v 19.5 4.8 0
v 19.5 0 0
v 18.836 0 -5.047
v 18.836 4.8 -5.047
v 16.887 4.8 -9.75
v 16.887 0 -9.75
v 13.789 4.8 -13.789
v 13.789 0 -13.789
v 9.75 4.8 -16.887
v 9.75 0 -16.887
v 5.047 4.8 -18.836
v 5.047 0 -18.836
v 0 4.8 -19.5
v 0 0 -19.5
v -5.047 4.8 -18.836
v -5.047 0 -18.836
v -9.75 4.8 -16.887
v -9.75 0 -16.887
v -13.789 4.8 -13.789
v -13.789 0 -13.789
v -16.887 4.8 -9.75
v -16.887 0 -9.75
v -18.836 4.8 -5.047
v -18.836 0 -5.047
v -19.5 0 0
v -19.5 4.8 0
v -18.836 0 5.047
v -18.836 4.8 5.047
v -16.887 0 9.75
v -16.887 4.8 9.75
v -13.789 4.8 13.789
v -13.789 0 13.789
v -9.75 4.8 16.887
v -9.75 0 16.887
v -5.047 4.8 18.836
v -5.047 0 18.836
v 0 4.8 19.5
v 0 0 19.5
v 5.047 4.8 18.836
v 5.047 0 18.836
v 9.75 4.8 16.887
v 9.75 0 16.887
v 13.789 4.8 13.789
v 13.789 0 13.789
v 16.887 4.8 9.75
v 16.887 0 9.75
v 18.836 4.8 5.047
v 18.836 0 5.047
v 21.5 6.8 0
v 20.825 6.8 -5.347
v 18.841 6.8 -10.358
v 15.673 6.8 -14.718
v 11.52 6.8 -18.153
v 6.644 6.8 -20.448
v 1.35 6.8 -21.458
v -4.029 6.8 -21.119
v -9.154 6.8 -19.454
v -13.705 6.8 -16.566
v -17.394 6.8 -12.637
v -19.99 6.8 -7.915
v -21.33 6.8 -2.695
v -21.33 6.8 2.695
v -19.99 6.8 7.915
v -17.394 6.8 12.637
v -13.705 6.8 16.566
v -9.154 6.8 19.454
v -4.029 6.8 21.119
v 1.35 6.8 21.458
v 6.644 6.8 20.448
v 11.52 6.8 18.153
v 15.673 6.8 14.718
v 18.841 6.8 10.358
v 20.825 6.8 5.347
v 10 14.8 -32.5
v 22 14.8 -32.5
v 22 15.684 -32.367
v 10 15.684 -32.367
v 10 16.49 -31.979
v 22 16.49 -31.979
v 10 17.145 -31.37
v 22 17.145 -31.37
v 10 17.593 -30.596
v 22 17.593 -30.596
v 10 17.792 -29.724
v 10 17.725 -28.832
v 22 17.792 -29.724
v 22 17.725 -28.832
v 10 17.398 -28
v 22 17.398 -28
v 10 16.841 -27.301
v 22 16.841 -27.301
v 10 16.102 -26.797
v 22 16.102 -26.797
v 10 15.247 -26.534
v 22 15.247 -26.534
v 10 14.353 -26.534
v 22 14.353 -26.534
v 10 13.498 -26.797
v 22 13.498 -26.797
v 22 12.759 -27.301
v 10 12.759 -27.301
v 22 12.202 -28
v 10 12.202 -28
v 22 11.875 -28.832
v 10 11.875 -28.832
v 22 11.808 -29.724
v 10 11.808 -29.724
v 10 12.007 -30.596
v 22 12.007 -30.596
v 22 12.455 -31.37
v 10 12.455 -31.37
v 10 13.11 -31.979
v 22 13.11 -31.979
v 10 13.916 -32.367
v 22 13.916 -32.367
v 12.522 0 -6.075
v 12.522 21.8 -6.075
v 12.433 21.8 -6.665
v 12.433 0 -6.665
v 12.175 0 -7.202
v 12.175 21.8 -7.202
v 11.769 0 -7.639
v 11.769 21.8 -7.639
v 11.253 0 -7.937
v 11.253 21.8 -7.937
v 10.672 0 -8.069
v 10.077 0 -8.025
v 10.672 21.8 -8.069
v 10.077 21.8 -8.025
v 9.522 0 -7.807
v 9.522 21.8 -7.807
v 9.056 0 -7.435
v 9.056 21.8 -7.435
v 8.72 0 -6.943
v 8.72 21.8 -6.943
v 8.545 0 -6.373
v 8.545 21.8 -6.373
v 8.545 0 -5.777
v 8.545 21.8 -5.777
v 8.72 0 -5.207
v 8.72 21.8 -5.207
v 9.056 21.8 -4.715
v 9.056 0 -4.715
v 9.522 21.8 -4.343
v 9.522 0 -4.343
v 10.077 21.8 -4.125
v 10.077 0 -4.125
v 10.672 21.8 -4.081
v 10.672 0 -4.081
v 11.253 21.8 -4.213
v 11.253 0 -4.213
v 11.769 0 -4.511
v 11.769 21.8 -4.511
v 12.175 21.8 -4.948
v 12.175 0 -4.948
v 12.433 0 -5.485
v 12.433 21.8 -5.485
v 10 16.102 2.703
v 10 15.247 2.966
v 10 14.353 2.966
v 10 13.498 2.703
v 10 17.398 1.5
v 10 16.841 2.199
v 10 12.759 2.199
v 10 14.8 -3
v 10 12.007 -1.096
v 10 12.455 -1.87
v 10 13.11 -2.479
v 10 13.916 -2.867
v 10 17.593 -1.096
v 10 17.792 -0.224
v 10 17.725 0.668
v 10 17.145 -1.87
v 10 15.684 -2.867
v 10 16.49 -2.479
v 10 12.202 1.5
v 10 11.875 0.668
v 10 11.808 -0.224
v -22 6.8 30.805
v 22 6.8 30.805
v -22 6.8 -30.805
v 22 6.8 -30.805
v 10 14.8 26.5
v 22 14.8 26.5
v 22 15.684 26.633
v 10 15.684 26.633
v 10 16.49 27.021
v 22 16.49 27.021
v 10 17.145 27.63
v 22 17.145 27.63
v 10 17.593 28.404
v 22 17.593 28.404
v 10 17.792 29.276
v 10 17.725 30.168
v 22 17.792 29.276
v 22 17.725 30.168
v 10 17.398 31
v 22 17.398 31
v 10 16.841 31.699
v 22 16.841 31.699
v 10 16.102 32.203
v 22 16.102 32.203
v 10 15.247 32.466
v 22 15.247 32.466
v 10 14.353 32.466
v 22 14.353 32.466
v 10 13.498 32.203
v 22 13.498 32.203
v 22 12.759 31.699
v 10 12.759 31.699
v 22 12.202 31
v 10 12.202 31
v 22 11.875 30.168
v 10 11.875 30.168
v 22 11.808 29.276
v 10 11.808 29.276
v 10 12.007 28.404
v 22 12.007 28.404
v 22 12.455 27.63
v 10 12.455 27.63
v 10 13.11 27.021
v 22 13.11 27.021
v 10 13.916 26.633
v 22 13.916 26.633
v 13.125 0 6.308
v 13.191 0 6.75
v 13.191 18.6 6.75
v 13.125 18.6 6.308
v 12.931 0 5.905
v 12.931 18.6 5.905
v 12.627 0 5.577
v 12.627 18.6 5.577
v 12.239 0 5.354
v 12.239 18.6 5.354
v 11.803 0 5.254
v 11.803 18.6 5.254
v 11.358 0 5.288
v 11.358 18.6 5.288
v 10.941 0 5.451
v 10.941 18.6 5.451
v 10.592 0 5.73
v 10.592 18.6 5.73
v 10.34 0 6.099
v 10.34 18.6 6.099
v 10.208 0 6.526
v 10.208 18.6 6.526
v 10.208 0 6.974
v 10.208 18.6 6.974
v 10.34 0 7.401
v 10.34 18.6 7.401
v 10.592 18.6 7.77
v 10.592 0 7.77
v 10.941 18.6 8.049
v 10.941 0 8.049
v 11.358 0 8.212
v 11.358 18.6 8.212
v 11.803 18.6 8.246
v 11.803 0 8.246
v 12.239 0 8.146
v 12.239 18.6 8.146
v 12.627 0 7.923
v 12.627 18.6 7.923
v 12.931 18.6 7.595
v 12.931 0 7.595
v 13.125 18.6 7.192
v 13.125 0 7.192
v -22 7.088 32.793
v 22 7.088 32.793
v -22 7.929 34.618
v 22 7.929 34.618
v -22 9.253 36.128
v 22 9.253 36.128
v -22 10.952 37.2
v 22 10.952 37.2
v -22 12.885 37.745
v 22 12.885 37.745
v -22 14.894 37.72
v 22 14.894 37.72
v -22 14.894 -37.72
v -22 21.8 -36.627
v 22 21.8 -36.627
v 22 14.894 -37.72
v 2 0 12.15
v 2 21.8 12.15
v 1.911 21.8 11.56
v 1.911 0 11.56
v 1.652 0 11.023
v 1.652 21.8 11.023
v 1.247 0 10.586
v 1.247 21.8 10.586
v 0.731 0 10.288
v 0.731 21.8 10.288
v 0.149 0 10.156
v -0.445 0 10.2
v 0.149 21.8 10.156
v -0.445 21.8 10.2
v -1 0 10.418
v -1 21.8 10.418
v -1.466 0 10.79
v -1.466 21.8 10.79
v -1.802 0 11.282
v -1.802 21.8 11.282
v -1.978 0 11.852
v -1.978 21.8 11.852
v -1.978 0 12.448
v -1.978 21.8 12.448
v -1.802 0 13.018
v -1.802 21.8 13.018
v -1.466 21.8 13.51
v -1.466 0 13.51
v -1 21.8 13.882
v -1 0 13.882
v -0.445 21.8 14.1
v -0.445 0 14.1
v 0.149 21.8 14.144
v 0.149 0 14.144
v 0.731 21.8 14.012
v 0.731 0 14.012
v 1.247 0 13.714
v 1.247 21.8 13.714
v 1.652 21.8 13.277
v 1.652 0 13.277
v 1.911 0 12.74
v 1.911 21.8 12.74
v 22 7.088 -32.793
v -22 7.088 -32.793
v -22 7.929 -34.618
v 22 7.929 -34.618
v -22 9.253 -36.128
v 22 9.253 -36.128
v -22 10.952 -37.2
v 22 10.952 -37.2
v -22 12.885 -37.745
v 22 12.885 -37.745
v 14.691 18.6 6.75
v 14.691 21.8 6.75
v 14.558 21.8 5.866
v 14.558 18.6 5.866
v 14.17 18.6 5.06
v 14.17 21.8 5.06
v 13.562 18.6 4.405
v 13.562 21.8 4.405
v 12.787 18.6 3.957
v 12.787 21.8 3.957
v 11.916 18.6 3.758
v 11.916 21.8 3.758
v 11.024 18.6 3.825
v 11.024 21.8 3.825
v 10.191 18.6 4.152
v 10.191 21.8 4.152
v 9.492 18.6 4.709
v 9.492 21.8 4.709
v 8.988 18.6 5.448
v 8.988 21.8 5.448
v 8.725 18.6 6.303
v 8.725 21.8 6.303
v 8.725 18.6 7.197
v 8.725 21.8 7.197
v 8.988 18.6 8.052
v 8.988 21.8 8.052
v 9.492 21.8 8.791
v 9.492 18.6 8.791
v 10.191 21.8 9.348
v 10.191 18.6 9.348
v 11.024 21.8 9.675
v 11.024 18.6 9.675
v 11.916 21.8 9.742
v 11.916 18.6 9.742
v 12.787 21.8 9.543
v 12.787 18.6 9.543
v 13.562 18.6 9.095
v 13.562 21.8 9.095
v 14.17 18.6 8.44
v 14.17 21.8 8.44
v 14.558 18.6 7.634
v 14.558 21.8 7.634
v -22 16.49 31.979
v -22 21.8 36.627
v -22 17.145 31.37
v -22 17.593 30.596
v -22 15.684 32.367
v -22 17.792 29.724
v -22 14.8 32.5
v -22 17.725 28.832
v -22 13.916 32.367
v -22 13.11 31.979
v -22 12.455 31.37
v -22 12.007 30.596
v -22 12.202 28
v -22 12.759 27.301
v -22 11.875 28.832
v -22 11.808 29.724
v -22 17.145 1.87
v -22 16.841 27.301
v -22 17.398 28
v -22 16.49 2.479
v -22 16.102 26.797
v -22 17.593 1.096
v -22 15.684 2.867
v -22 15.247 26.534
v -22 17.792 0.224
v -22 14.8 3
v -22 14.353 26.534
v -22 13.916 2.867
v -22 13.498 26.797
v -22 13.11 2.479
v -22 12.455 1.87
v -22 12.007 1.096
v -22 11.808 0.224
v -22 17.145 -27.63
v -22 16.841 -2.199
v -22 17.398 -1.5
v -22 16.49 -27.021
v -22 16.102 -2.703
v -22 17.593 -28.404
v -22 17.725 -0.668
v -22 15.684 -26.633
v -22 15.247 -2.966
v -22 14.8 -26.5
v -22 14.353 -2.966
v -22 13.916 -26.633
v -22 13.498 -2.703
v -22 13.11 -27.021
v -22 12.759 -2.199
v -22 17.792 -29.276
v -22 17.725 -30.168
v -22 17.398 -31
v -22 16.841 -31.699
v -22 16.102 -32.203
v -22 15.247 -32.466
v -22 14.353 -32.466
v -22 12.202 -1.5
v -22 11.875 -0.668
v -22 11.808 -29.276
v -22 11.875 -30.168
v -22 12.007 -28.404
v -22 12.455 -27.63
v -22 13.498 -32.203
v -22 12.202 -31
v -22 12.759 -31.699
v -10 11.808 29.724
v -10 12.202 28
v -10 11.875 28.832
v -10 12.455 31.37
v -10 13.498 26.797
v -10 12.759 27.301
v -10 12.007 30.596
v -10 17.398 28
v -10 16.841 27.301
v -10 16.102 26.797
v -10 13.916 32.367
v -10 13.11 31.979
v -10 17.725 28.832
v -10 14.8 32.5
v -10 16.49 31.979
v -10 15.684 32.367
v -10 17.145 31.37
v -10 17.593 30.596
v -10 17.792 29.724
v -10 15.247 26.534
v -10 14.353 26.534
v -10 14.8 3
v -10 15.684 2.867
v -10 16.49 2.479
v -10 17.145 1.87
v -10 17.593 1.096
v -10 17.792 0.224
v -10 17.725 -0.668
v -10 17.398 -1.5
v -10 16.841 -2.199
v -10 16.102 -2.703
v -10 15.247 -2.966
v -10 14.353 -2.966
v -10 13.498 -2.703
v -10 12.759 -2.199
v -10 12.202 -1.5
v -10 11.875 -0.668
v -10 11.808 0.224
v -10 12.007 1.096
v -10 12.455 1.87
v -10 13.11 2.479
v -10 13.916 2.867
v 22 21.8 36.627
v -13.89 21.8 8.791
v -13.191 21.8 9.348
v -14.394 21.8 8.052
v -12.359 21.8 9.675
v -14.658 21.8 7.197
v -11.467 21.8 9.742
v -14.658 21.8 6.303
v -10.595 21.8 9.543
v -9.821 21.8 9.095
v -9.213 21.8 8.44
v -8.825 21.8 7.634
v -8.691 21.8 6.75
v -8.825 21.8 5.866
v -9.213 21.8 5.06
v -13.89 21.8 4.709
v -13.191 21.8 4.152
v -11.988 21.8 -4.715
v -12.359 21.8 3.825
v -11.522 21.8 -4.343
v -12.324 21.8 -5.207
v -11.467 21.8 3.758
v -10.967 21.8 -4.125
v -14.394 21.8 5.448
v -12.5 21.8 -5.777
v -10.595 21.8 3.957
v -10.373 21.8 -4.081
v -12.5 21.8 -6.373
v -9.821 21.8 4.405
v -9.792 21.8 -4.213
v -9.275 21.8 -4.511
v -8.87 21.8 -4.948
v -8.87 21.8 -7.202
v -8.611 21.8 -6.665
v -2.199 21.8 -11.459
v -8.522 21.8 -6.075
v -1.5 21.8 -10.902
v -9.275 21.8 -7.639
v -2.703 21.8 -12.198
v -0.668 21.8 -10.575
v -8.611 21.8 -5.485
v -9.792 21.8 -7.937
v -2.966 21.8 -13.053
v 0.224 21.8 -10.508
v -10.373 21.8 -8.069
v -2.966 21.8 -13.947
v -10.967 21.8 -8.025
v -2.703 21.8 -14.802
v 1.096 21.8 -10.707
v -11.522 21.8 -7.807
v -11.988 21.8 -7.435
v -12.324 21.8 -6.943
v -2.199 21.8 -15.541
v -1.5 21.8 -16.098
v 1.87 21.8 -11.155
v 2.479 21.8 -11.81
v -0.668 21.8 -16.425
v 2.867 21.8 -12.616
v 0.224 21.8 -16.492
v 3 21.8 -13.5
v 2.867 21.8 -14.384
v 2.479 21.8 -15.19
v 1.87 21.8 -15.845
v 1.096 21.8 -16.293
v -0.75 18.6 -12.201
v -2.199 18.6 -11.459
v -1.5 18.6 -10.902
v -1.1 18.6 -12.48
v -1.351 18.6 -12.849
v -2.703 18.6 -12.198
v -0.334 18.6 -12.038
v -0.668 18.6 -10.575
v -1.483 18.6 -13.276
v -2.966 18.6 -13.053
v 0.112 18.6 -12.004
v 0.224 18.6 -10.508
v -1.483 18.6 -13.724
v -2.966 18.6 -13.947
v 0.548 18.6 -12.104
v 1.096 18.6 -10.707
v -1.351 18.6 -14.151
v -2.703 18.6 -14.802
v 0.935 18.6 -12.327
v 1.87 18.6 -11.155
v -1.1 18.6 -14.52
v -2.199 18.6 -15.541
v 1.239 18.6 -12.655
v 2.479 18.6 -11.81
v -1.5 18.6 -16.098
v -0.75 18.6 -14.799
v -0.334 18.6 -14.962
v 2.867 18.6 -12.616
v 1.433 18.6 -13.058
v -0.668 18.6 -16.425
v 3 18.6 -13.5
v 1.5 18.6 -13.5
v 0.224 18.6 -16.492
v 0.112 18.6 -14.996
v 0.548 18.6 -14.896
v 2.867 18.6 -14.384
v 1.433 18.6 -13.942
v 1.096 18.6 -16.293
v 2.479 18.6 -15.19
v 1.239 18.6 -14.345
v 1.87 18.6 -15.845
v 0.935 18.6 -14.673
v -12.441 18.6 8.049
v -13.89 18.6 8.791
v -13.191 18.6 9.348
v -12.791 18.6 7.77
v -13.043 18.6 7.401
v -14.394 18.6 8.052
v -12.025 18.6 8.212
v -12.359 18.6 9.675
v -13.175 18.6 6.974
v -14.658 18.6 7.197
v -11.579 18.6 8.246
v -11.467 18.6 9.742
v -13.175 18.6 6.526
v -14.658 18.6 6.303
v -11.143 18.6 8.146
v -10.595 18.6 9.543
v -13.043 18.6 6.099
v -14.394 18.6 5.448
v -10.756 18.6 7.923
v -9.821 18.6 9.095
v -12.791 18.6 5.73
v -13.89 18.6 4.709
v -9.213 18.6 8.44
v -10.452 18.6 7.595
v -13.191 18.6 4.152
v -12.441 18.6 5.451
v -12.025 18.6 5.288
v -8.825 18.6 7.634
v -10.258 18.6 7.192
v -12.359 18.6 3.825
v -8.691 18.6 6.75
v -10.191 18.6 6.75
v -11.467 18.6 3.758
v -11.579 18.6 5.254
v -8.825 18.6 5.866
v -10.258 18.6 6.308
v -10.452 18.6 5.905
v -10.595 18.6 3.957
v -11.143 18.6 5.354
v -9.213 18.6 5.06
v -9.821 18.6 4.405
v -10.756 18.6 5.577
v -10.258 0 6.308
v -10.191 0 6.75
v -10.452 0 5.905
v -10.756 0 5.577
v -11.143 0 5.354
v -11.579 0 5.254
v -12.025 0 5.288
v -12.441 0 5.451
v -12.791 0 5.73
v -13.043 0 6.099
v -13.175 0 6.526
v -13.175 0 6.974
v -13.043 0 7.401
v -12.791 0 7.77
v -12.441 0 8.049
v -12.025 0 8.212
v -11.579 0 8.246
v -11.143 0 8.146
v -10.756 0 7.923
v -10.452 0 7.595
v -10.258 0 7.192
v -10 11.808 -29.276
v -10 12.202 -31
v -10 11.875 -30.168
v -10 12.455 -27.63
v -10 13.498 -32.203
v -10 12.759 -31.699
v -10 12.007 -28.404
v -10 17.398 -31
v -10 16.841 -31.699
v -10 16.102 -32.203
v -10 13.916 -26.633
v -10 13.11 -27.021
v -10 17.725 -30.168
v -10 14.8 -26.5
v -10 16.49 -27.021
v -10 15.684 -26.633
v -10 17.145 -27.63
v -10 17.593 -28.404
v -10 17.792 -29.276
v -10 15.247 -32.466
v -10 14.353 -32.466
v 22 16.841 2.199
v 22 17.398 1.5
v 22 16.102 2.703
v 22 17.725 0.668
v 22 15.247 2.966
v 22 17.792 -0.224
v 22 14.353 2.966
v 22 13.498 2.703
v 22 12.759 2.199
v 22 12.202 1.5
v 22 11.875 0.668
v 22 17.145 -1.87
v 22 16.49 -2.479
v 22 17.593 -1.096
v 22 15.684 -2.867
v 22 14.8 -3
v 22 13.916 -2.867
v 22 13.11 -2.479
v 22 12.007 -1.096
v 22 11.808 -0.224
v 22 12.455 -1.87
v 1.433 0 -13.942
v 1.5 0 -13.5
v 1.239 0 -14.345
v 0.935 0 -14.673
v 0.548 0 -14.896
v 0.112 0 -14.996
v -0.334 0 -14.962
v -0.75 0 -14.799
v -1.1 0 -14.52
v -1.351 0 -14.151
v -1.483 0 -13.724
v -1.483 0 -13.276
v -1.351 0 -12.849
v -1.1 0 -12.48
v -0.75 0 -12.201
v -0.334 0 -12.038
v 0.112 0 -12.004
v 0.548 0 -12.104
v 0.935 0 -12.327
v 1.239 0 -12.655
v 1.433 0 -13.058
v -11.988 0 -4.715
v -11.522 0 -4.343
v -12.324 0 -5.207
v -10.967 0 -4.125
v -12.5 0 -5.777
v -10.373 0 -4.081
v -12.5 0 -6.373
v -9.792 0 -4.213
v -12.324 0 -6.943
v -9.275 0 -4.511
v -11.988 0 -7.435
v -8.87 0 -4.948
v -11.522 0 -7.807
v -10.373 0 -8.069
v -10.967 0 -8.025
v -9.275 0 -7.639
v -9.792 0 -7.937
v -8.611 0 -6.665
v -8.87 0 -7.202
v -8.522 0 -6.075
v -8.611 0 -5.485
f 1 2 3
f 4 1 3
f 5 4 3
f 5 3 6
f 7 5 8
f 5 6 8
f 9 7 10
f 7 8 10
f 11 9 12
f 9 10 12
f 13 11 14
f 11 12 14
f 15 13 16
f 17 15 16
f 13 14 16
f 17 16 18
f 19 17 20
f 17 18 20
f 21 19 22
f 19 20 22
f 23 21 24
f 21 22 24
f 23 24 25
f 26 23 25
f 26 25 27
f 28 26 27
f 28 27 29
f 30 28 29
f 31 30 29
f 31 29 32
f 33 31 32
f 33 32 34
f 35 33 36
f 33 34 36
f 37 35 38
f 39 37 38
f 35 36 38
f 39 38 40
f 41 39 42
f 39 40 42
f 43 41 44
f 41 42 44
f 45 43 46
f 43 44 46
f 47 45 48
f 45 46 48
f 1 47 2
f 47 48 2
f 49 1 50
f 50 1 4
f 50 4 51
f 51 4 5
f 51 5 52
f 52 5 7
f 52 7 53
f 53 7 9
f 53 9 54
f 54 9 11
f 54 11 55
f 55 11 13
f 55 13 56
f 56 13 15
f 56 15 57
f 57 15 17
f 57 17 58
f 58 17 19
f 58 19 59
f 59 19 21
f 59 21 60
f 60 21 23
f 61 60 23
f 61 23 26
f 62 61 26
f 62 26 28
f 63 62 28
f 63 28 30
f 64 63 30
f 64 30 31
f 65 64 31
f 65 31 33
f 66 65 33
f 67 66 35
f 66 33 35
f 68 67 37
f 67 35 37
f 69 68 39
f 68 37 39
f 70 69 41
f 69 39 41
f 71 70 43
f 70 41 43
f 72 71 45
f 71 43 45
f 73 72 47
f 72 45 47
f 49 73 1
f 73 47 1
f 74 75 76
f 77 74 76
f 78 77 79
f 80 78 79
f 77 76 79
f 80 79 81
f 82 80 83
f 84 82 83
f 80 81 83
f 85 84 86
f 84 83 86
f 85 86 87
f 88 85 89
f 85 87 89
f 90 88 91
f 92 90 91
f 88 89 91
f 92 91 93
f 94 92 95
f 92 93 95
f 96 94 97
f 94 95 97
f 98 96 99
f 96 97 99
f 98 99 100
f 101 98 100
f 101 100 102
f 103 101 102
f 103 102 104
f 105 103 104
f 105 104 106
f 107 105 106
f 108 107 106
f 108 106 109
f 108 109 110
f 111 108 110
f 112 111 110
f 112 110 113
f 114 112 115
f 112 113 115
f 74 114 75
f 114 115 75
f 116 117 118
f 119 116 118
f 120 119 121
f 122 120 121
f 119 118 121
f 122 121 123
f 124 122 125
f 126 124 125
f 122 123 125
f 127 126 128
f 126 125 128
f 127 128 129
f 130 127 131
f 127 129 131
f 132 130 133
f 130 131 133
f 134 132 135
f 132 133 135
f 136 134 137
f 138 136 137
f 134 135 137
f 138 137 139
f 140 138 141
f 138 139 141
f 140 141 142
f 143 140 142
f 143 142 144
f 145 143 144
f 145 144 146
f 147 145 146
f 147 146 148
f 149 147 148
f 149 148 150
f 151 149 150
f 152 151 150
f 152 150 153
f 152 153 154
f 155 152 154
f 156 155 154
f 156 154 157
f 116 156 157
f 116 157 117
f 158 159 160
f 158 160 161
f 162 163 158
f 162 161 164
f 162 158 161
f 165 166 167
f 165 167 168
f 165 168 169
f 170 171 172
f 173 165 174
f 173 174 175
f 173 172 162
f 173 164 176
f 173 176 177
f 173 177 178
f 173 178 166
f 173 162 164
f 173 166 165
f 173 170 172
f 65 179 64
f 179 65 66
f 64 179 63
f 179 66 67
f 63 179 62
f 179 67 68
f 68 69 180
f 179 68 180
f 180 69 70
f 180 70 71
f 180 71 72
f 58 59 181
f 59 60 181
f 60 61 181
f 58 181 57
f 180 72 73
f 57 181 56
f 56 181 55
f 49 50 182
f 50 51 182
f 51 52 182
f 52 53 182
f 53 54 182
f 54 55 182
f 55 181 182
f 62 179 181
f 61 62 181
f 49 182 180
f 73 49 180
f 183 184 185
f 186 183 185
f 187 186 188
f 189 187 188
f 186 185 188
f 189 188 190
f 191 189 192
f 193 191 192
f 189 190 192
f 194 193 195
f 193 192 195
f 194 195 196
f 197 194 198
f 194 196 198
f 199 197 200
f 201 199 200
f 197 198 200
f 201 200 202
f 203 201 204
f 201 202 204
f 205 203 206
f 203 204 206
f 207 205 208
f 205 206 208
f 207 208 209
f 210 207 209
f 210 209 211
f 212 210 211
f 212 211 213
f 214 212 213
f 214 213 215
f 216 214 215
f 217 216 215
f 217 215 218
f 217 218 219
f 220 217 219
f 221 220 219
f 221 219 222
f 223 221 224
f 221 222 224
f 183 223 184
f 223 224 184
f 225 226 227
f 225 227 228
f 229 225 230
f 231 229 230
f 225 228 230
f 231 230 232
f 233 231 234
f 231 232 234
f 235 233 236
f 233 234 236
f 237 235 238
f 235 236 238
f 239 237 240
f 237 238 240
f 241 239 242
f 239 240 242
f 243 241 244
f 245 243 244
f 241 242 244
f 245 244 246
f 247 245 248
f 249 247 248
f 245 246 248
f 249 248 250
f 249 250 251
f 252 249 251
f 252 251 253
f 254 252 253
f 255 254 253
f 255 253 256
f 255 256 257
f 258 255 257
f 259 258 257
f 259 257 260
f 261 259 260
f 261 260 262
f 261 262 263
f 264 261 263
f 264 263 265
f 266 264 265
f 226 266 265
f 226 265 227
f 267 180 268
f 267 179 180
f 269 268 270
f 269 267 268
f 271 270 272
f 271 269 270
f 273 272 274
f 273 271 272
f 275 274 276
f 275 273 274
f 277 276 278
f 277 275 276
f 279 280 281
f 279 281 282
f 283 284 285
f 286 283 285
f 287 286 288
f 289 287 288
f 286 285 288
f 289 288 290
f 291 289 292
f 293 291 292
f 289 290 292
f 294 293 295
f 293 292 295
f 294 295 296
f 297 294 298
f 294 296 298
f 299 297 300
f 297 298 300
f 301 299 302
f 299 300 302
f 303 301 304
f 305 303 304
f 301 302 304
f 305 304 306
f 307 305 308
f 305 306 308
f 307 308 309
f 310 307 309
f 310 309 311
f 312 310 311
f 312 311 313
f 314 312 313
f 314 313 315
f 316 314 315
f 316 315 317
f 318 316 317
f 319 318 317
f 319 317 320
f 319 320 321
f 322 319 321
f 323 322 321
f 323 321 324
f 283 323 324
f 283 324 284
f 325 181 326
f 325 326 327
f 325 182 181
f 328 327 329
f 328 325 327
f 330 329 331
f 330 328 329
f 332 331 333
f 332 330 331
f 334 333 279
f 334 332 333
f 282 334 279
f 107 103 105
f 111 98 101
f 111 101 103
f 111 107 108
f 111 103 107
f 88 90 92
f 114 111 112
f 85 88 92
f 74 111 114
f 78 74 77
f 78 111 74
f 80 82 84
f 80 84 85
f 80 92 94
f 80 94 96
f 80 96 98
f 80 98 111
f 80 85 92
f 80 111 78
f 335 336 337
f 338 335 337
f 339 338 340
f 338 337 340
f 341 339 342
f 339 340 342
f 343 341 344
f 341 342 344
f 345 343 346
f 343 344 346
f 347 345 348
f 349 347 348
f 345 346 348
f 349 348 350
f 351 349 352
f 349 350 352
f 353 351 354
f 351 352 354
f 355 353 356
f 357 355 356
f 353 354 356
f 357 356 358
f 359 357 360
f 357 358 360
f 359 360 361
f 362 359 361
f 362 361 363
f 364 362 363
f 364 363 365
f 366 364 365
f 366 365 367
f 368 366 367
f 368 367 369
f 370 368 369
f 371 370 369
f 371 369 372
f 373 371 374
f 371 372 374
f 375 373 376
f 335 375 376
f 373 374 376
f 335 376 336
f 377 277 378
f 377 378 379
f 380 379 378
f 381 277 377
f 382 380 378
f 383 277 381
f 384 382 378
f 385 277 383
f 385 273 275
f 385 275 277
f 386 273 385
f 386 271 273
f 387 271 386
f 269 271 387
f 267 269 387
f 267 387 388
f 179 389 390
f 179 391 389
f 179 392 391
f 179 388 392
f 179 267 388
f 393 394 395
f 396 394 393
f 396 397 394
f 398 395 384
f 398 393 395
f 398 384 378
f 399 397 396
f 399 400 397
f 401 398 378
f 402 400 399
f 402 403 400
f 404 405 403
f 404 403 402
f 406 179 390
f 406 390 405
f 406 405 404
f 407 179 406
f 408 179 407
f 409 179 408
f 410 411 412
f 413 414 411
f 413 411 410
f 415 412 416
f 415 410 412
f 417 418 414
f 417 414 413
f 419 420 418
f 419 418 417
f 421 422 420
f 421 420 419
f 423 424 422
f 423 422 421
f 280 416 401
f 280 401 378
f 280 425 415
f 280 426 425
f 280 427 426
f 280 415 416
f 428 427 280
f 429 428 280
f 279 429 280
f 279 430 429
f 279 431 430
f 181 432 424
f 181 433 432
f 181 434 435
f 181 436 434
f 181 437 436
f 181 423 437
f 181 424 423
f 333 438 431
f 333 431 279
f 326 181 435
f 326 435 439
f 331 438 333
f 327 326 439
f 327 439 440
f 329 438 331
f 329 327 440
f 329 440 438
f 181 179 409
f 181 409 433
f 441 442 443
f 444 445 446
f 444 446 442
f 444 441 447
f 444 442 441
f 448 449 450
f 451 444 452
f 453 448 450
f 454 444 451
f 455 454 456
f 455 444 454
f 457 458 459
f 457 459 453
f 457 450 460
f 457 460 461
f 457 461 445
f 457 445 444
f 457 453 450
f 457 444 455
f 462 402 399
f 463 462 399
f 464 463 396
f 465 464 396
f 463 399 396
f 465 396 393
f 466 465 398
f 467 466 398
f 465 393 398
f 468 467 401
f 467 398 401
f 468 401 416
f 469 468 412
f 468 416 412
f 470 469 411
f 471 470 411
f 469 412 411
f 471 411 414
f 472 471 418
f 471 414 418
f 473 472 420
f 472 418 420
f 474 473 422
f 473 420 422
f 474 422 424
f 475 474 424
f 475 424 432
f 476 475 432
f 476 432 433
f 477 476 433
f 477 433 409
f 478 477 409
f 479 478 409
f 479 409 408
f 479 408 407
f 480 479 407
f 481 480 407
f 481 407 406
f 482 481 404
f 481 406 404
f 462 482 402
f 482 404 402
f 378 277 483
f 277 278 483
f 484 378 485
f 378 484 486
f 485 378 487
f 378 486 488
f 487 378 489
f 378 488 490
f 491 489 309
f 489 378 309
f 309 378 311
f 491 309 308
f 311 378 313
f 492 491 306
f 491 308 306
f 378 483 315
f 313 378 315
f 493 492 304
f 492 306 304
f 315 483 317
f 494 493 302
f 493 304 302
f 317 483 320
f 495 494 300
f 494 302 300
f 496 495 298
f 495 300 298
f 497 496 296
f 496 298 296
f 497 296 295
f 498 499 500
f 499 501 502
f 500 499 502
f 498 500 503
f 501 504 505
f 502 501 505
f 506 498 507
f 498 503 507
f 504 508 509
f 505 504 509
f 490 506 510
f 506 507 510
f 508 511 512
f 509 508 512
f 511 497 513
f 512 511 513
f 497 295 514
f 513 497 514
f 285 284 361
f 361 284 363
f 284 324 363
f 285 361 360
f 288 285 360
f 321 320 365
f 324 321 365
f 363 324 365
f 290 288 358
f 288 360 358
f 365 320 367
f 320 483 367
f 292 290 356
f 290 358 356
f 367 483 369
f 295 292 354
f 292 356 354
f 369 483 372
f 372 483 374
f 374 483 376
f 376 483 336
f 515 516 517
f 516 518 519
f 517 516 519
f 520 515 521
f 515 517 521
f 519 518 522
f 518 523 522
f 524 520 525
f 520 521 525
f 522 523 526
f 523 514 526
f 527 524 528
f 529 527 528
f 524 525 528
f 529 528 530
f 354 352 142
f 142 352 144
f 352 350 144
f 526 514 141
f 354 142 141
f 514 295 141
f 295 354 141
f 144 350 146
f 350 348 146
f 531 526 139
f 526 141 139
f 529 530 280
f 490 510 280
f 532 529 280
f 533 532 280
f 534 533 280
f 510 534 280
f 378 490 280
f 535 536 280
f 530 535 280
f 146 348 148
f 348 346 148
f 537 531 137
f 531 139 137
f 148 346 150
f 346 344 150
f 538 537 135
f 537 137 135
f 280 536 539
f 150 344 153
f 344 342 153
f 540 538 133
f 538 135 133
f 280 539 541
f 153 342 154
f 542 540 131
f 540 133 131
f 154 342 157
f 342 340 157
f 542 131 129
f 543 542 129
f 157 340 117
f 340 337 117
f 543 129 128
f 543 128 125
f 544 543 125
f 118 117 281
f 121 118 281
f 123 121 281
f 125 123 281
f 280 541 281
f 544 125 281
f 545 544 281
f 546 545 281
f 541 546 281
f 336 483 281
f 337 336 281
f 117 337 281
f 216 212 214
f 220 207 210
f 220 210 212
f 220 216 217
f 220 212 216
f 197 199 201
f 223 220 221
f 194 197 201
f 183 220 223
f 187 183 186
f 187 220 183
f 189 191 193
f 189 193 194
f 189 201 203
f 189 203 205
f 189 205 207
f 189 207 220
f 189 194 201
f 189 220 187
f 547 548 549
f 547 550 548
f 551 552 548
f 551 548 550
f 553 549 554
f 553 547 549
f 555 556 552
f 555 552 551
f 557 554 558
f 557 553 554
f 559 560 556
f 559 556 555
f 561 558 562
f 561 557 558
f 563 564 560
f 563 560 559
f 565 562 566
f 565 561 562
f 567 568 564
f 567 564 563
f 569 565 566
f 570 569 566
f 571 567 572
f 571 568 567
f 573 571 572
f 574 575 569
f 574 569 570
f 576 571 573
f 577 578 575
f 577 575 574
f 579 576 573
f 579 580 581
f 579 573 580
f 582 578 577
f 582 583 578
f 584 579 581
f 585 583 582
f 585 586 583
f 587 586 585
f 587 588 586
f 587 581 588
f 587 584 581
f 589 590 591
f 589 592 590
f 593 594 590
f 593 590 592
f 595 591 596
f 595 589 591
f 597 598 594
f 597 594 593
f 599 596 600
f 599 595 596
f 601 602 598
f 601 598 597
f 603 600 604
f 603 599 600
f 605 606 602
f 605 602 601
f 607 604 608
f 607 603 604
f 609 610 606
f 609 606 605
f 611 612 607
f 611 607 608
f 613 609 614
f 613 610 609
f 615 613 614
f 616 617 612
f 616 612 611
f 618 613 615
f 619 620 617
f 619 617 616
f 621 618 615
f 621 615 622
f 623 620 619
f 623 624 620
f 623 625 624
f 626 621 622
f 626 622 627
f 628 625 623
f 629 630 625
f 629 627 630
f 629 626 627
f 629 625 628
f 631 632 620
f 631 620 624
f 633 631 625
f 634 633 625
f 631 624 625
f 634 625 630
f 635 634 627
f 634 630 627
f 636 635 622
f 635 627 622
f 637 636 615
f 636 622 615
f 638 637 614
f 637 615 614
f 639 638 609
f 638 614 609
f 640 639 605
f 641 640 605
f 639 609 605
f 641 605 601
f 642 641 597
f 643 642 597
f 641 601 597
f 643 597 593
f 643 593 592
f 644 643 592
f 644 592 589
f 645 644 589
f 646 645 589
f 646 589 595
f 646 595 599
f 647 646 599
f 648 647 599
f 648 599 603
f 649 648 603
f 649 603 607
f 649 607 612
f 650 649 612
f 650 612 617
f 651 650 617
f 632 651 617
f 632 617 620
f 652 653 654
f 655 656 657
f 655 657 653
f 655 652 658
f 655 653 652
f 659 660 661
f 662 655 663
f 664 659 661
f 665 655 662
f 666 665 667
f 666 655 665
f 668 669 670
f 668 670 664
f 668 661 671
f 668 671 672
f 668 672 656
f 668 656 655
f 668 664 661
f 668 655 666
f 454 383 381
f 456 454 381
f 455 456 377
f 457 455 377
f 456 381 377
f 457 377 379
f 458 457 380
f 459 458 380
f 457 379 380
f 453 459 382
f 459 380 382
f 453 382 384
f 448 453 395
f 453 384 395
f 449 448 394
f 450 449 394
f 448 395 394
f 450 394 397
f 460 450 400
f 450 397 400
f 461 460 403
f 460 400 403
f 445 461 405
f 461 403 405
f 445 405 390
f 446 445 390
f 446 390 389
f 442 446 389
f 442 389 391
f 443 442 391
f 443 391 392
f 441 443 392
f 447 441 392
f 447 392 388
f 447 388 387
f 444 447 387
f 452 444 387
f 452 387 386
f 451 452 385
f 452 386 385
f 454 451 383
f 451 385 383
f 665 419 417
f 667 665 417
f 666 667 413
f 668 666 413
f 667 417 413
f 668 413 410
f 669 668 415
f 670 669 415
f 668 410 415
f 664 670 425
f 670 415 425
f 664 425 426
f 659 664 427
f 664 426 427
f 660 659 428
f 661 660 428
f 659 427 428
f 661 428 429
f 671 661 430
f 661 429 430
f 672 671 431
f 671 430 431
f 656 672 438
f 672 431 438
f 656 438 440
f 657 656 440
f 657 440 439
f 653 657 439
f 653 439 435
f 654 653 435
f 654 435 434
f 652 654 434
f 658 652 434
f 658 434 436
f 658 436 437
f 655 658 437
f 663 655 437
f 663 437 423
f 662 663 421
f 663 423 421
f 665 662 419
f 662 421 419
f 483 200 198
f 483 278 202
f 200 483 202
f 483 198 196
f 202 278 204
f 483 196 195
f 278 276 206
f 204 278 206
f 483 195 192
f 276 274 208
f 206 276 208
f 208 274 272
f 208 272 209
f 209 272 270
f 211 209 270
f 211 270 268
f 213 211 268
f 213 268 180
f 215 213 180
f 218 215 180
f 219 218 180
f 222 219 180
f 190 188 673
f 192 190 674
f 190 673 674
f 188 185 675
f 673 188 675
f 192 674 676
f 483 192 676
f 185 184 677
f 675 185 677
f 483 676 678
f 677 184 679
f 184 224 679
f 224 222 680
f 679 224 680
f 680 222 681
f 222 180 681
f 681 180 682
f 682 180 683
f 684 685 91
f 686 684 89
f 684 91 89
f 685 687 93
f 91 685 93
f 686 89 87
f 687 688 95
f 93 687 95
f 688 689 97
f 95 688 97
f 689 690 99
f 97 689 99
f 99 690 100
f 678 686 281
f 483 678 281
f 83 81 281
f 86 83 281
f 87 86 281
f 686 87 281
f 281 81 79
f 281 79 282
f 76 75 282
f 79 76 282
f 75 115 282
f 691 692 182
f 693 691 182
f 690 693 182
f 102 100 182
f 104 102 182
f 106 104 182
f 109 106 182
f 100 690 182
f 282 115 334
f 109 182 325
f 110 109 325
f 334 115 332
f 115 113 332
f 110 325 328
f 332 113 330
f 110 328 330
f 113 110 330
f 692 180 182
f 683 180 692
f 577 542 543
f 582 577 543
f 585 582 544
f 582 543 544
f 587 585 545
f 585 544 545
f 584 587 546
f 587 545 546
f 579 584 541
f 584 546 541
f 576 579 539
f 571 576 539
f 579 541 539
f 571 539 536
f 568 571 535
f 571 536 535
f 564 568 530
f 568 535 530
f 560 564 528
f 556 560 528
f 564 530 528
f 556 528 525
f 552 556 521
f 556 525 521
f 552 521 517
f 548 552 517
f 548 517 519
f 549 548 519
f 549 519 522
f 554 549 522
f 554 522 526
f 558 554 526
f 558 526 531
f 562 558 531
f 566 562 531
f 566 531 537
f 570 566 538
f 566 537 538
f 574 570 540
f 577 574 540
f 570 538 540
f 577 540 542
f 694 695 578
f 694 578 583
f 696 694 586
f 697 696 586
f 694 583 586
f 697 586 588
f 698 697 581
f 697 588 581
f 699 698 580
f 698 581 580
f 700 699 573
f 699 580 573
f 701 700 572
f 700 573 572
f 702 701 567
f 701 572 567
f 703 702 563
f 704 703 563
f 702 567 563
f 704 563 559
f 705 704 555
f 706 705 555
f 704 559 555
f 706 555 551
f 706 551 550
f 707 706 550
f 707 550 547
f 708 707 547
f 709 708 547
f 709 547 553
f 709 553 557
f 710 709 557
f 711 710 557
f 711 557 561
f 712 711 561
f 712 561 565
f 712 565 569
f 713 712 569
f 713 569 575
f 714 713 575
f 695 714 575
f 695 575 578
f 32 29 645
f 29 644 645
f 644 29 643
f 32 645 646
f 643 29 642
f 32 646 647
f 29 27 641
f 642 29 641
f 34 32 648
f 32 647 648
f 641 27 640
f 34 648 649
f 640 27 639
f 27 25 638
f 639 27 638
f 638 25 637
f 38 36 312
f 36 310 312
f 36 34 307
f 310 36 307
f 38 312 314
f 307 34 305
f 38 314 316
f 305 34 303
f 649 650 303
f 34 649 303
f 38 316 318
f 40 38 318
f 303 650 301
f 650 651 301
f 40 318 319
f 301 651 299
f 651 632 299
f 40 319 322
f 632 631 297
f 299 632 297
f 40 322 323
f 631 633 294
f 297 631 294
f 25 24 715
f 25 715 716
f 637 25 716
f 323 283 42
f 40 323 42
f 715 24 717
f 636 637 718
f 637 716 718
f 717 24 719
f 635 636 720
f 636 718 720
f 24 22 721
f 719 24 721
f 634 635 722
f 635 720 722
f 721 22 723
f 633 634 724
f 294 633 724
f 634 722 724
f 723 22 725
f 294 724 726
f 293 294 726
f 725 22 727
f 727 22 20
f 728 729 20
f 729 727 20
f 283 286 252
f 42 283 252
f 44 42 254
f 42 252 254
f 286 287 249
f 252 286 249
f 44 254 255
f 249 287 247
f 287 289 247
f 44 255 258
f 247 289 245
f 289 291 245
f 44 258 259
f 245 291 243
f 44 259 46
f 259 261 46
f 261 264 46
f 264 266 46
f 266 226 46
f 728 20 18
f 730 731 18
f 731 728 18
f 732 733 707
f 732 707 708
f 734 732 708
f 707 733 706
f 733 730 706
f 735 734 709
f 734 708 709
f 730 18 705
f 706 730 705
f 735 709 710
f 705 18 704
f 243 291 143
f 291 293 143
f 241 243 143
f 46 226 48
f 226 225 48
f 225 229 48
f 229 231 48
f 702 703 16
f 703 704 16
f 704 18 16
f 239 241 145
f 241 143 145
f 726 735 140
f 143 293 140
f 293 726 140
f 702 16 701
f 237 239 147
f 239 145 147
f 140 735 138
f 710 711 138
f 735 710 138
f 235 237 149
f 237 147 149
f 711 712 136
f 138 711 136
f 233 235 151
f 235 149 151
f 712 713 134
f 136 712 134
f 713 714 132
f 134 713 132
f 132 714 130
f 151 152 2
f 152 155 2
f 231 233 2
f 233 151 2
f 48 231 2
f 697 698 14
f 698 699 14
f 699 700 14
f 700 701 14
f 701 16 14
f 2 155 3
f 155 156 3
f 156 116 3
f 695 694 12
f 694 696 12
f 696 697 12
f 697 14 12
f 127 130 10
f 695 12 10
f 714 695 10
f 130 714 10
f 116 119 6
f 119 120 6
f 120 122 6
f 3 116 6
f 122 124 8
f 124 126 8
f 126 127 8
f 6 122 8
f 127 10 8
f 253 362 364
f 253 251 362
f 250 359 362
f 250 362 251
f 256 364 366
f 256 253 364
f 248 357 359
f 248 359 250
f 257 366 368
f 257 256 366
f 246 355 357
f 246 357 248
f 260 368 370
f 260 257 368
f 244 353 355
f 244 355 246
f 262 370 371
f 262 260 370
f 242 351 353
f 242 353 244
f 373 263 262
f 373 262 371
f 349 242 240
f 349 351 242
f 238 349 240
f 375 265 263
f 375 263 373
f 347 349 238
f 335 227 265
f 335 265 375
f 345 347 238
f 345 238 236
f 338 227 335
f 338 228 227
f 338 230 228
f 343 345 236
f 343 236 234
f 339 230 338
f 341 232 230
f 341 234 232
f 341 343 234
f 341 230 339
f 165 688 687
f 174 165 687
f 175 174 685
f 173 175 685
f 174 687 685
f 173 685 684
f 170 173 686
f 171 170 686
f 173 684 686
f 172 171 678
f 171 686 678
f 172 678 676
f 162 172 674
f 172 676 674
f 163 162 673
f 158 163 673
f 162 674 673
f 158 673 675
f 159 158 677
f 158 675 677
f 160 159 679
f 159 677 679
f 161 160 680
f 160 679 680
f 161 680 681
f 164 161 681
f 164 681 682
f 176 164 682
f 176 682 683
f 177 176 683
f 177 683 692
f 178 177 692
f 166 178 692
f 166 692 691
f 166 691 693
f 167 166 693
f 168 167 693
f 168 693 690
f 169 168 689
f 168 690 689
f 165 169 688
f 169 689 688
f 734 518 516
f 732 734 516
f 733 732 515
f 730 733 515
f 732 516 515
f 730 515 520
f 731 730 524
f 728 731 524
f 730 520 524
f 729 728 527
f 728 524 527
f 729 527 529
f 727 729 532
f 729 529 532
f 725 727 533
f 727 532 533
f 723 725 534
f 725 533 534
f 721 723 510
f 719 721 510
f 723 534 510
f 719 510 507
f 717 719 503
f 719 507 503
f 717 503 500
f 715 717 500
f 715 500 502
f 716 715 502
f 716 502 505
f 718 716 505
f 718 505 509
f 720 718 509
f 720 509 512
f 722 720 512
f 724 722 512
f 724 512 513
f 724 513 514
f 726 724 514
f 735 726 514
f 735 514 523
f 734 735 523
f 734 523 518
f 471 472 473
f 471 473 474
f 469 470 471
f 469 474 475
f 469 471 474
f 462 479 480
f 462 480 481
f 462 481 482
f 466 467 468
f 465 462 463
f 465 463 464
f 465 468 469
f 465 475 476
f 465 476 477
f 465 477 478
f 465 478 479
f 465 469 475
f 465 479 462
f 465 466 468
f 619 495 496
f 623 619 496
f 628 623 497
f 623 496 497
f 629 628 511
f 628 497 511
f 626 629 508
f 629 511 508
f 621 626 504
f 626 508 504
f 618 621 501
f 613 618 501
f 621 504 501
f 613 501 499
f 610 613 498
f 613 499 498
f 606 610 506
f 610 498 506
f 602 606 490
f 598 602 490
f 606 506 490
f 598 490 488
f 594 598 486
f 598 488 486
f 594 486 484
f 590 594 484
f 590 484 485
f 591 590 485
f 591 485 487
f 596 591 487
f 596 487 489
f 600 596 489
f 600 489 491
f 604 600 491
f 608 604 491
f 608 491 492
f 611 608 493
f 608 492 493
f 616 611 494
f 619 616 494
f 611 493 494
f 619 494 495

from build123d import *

# Parameters (mm, degrees)
SKETCH_1_R          = 19.5
SKETCH_1_R_2        = 2
SKETCH_1_R_3        = 1.5
EXTRUDE_1_DEPTH     = 6.8
SKETCH_2_W          = 44
SKETCH_2_H          = 78
EXTRUDE_2_DEPTH     = 70
SKETCH_3_R          = 3
CUT_EXTRUDE_1_DEPTH = 12
CUT_EXTRUDE_2_DEPTH = 33
SKETCH_6_R          = 3
CUT_EXTRUDE_3_DEPTH = 12
CHAMFER_1_SIZE      = 2
FILLET_1_R          = 7
SKETCH_7_R          = 2
SKETCH_7_R_2        = 1.5
CUT_EXTRUDE_4_DEPTH = 22.8
SKETCH_8_R          = 3
CUT_EXTRUDE_5_DEPTH = 3.2


with BuildPart() as part:
    # 草图1 → 凸台-拉伸1 (new body)
    with BuildSketch(Plane(origin=(0, 0, 0), x_dir=(1, 0, 0), z_dir=(0, 1, 0))):
        Circle(SKETCH_1_R)
        with Locations((10.522208656, 6.075)):
            Circle(SKETCH_1_R_2, mode=Mode.SUBTRACT)
        with Locations((-10.522208656, 6.075)):
            Circle(SKETCH_1_R_2, mode=Mode.SUBTRACT)
        with Locations((0, -12.15)):
            Circle(SKETCH_1_R_2, mode=Mode.SUBTRACT)
        with Locations((0, 13.5)):
            Circle(SKETCH_1_R_3, mode=Mode.SUBTRACT)
        with Locations((11.691342951, -6.75)):
            Circle(SKETCH_1_R_3, mode=Mode.SUBTRACT)
        with Locations((-11.691342951, -6.75)):
            Circle(SKETCH_1_R_3, mode=Mode.SUBTRACT)
    extrude(amount=EXTRUDE_1_DEPTH)

    # 草图2 → 凸台-拉伸2 (add)
    with BuildSketch(Plane(origin=(0, 6.8, 0), x_dir=(1, 0, 0), z_dir=(0, 1, 0))):
        Rectangle(SKETCH_2_W, SKETCH_2_H)
    extrude(amount=EXTRUDE_2_DEPTH)

    # 草图3 → 切除-拉伸1 (cut)
    with BuildSketch(Plane(origin=(22, 0, 0), x_dir=(0, 0, -1), z_dir=(1, 0, 0))):
        with Locations((0, 14.8)):
            Circle(SKETCH_3_R)
        with Locations((-29.5, 14.8)):
            Circle(SKETCH_3_R)
        with Locations((29.5, 14.8)):
            Circle(SKETCH_3_R)
        Polygon((-39, 6.8), (-36.626907991, 21.8), (36.626907991, 21.8), (39, 6.8), (44.081826142, 6.8), (44.081826142, 83.498576474), (-44.081826142, 83.498576474), (-44.081826142, 6.8), align=None)
    extrude(amount=-CUT_EXTRUDE_1_DEPTH, mode=Mode.SUBTRACT)

    # 草图5 → 切除-拉伸2 (cut, through all)
    with BuildSketch(Plane(origin=(10, 0, 0), x_dir=(0, 0, -1), z_dir=(1, 0, 0))):
        Polygon((-39, 6.8), (-36.626907991, 21.8), (36.626907991, 21.8), (39, 6.8), (39, 76.8), (-39, 76.8), align=None)
    extrude(amount=-CUT_EXTRUDE_2_DEPTH, mode=Mode.SUBTRACT)

    # 草图6 → 切除-拉伸3 (cut)
    with BuildSketch(Plane.ZY.offset(22)):
        with Locations((-29.5, 14.8)):
            Circle(SKETCH_6_R)
        with Locations((0, 14.8)):
            Circle(SKETCH_6_R)
        with Locations((29.5, 14.8)):
            Circle(SKETCH_6_R)
    extrude(amount=-CUT_EXTRUDE_3_DEPTH, mode=Mode.SUBTRACT)

    # 倒角1
    chamfer_1_edges = [part.edges().sort_by_distance(p)[0] for p in [
        (-19.5, 6.8, 0),
    ]]
    chamfer(chamfer_1_edges, length=CHAMFER_1_SIZE)

    # 圆角1
    fillet_1_edges = [part.edges().sort_by_distance(p)[0] for p in [
        (0, 6.8, -39),
        (0, 6.8, 39),
    ]]
    fillet(fillet_1_edges, radius=FILLET_1_R)

    # 草图7 → 切除-拉伸4 (cut, through all)
    with BuildSketch(Plane(origin=(0, 21.8, 0), x_dir=(1, 0, 0), z_dir=(0, 1, 0))):
        with Locations((10.522208656, 6.075)):
            Circle(SKETCH_7_R)
        with Locations((11.691342951, -6.75)):
            Circle(SKETCH_7_R_2)
        with Locations((0, -12.15)):
            Circle(SKETCH_7_R)
        with Locations((-11.691342951, -6.75)):
            Circle(SKETCH_7_R_2)
        with Locations((-10.522208656, 6.075)):
            Circle(SKETCH_7_R)
        with Locations((0, 13.5)):
            Circle(SKETCH_7_R_2)
    extrude(amount=-CUT_EXTRUDE_4_DEPTH, mode=Mode.SUBTRACT)

    # 草图8 → 切除-拉伸5 (cut)
    with BuildSketch(Plane(origin=(0, 21.8, 0), x_dir=(1, 0, 0), z_dir=(0, 1, 0))):
        with Locations((0, 13.5)):
            Circle(SKETCH_8_R)
        with Locations((11.691342951, -6.75)):
            Circle(SKETCH_8_R)
        with Locations((-11.691342951, -6.75)):
            Circle(SKETCH_8_R)
    extrude(amount=-CUT_EXTRUDE_5_DEPTH, mode=Mode.SUBTRACT)


solid = part.part
